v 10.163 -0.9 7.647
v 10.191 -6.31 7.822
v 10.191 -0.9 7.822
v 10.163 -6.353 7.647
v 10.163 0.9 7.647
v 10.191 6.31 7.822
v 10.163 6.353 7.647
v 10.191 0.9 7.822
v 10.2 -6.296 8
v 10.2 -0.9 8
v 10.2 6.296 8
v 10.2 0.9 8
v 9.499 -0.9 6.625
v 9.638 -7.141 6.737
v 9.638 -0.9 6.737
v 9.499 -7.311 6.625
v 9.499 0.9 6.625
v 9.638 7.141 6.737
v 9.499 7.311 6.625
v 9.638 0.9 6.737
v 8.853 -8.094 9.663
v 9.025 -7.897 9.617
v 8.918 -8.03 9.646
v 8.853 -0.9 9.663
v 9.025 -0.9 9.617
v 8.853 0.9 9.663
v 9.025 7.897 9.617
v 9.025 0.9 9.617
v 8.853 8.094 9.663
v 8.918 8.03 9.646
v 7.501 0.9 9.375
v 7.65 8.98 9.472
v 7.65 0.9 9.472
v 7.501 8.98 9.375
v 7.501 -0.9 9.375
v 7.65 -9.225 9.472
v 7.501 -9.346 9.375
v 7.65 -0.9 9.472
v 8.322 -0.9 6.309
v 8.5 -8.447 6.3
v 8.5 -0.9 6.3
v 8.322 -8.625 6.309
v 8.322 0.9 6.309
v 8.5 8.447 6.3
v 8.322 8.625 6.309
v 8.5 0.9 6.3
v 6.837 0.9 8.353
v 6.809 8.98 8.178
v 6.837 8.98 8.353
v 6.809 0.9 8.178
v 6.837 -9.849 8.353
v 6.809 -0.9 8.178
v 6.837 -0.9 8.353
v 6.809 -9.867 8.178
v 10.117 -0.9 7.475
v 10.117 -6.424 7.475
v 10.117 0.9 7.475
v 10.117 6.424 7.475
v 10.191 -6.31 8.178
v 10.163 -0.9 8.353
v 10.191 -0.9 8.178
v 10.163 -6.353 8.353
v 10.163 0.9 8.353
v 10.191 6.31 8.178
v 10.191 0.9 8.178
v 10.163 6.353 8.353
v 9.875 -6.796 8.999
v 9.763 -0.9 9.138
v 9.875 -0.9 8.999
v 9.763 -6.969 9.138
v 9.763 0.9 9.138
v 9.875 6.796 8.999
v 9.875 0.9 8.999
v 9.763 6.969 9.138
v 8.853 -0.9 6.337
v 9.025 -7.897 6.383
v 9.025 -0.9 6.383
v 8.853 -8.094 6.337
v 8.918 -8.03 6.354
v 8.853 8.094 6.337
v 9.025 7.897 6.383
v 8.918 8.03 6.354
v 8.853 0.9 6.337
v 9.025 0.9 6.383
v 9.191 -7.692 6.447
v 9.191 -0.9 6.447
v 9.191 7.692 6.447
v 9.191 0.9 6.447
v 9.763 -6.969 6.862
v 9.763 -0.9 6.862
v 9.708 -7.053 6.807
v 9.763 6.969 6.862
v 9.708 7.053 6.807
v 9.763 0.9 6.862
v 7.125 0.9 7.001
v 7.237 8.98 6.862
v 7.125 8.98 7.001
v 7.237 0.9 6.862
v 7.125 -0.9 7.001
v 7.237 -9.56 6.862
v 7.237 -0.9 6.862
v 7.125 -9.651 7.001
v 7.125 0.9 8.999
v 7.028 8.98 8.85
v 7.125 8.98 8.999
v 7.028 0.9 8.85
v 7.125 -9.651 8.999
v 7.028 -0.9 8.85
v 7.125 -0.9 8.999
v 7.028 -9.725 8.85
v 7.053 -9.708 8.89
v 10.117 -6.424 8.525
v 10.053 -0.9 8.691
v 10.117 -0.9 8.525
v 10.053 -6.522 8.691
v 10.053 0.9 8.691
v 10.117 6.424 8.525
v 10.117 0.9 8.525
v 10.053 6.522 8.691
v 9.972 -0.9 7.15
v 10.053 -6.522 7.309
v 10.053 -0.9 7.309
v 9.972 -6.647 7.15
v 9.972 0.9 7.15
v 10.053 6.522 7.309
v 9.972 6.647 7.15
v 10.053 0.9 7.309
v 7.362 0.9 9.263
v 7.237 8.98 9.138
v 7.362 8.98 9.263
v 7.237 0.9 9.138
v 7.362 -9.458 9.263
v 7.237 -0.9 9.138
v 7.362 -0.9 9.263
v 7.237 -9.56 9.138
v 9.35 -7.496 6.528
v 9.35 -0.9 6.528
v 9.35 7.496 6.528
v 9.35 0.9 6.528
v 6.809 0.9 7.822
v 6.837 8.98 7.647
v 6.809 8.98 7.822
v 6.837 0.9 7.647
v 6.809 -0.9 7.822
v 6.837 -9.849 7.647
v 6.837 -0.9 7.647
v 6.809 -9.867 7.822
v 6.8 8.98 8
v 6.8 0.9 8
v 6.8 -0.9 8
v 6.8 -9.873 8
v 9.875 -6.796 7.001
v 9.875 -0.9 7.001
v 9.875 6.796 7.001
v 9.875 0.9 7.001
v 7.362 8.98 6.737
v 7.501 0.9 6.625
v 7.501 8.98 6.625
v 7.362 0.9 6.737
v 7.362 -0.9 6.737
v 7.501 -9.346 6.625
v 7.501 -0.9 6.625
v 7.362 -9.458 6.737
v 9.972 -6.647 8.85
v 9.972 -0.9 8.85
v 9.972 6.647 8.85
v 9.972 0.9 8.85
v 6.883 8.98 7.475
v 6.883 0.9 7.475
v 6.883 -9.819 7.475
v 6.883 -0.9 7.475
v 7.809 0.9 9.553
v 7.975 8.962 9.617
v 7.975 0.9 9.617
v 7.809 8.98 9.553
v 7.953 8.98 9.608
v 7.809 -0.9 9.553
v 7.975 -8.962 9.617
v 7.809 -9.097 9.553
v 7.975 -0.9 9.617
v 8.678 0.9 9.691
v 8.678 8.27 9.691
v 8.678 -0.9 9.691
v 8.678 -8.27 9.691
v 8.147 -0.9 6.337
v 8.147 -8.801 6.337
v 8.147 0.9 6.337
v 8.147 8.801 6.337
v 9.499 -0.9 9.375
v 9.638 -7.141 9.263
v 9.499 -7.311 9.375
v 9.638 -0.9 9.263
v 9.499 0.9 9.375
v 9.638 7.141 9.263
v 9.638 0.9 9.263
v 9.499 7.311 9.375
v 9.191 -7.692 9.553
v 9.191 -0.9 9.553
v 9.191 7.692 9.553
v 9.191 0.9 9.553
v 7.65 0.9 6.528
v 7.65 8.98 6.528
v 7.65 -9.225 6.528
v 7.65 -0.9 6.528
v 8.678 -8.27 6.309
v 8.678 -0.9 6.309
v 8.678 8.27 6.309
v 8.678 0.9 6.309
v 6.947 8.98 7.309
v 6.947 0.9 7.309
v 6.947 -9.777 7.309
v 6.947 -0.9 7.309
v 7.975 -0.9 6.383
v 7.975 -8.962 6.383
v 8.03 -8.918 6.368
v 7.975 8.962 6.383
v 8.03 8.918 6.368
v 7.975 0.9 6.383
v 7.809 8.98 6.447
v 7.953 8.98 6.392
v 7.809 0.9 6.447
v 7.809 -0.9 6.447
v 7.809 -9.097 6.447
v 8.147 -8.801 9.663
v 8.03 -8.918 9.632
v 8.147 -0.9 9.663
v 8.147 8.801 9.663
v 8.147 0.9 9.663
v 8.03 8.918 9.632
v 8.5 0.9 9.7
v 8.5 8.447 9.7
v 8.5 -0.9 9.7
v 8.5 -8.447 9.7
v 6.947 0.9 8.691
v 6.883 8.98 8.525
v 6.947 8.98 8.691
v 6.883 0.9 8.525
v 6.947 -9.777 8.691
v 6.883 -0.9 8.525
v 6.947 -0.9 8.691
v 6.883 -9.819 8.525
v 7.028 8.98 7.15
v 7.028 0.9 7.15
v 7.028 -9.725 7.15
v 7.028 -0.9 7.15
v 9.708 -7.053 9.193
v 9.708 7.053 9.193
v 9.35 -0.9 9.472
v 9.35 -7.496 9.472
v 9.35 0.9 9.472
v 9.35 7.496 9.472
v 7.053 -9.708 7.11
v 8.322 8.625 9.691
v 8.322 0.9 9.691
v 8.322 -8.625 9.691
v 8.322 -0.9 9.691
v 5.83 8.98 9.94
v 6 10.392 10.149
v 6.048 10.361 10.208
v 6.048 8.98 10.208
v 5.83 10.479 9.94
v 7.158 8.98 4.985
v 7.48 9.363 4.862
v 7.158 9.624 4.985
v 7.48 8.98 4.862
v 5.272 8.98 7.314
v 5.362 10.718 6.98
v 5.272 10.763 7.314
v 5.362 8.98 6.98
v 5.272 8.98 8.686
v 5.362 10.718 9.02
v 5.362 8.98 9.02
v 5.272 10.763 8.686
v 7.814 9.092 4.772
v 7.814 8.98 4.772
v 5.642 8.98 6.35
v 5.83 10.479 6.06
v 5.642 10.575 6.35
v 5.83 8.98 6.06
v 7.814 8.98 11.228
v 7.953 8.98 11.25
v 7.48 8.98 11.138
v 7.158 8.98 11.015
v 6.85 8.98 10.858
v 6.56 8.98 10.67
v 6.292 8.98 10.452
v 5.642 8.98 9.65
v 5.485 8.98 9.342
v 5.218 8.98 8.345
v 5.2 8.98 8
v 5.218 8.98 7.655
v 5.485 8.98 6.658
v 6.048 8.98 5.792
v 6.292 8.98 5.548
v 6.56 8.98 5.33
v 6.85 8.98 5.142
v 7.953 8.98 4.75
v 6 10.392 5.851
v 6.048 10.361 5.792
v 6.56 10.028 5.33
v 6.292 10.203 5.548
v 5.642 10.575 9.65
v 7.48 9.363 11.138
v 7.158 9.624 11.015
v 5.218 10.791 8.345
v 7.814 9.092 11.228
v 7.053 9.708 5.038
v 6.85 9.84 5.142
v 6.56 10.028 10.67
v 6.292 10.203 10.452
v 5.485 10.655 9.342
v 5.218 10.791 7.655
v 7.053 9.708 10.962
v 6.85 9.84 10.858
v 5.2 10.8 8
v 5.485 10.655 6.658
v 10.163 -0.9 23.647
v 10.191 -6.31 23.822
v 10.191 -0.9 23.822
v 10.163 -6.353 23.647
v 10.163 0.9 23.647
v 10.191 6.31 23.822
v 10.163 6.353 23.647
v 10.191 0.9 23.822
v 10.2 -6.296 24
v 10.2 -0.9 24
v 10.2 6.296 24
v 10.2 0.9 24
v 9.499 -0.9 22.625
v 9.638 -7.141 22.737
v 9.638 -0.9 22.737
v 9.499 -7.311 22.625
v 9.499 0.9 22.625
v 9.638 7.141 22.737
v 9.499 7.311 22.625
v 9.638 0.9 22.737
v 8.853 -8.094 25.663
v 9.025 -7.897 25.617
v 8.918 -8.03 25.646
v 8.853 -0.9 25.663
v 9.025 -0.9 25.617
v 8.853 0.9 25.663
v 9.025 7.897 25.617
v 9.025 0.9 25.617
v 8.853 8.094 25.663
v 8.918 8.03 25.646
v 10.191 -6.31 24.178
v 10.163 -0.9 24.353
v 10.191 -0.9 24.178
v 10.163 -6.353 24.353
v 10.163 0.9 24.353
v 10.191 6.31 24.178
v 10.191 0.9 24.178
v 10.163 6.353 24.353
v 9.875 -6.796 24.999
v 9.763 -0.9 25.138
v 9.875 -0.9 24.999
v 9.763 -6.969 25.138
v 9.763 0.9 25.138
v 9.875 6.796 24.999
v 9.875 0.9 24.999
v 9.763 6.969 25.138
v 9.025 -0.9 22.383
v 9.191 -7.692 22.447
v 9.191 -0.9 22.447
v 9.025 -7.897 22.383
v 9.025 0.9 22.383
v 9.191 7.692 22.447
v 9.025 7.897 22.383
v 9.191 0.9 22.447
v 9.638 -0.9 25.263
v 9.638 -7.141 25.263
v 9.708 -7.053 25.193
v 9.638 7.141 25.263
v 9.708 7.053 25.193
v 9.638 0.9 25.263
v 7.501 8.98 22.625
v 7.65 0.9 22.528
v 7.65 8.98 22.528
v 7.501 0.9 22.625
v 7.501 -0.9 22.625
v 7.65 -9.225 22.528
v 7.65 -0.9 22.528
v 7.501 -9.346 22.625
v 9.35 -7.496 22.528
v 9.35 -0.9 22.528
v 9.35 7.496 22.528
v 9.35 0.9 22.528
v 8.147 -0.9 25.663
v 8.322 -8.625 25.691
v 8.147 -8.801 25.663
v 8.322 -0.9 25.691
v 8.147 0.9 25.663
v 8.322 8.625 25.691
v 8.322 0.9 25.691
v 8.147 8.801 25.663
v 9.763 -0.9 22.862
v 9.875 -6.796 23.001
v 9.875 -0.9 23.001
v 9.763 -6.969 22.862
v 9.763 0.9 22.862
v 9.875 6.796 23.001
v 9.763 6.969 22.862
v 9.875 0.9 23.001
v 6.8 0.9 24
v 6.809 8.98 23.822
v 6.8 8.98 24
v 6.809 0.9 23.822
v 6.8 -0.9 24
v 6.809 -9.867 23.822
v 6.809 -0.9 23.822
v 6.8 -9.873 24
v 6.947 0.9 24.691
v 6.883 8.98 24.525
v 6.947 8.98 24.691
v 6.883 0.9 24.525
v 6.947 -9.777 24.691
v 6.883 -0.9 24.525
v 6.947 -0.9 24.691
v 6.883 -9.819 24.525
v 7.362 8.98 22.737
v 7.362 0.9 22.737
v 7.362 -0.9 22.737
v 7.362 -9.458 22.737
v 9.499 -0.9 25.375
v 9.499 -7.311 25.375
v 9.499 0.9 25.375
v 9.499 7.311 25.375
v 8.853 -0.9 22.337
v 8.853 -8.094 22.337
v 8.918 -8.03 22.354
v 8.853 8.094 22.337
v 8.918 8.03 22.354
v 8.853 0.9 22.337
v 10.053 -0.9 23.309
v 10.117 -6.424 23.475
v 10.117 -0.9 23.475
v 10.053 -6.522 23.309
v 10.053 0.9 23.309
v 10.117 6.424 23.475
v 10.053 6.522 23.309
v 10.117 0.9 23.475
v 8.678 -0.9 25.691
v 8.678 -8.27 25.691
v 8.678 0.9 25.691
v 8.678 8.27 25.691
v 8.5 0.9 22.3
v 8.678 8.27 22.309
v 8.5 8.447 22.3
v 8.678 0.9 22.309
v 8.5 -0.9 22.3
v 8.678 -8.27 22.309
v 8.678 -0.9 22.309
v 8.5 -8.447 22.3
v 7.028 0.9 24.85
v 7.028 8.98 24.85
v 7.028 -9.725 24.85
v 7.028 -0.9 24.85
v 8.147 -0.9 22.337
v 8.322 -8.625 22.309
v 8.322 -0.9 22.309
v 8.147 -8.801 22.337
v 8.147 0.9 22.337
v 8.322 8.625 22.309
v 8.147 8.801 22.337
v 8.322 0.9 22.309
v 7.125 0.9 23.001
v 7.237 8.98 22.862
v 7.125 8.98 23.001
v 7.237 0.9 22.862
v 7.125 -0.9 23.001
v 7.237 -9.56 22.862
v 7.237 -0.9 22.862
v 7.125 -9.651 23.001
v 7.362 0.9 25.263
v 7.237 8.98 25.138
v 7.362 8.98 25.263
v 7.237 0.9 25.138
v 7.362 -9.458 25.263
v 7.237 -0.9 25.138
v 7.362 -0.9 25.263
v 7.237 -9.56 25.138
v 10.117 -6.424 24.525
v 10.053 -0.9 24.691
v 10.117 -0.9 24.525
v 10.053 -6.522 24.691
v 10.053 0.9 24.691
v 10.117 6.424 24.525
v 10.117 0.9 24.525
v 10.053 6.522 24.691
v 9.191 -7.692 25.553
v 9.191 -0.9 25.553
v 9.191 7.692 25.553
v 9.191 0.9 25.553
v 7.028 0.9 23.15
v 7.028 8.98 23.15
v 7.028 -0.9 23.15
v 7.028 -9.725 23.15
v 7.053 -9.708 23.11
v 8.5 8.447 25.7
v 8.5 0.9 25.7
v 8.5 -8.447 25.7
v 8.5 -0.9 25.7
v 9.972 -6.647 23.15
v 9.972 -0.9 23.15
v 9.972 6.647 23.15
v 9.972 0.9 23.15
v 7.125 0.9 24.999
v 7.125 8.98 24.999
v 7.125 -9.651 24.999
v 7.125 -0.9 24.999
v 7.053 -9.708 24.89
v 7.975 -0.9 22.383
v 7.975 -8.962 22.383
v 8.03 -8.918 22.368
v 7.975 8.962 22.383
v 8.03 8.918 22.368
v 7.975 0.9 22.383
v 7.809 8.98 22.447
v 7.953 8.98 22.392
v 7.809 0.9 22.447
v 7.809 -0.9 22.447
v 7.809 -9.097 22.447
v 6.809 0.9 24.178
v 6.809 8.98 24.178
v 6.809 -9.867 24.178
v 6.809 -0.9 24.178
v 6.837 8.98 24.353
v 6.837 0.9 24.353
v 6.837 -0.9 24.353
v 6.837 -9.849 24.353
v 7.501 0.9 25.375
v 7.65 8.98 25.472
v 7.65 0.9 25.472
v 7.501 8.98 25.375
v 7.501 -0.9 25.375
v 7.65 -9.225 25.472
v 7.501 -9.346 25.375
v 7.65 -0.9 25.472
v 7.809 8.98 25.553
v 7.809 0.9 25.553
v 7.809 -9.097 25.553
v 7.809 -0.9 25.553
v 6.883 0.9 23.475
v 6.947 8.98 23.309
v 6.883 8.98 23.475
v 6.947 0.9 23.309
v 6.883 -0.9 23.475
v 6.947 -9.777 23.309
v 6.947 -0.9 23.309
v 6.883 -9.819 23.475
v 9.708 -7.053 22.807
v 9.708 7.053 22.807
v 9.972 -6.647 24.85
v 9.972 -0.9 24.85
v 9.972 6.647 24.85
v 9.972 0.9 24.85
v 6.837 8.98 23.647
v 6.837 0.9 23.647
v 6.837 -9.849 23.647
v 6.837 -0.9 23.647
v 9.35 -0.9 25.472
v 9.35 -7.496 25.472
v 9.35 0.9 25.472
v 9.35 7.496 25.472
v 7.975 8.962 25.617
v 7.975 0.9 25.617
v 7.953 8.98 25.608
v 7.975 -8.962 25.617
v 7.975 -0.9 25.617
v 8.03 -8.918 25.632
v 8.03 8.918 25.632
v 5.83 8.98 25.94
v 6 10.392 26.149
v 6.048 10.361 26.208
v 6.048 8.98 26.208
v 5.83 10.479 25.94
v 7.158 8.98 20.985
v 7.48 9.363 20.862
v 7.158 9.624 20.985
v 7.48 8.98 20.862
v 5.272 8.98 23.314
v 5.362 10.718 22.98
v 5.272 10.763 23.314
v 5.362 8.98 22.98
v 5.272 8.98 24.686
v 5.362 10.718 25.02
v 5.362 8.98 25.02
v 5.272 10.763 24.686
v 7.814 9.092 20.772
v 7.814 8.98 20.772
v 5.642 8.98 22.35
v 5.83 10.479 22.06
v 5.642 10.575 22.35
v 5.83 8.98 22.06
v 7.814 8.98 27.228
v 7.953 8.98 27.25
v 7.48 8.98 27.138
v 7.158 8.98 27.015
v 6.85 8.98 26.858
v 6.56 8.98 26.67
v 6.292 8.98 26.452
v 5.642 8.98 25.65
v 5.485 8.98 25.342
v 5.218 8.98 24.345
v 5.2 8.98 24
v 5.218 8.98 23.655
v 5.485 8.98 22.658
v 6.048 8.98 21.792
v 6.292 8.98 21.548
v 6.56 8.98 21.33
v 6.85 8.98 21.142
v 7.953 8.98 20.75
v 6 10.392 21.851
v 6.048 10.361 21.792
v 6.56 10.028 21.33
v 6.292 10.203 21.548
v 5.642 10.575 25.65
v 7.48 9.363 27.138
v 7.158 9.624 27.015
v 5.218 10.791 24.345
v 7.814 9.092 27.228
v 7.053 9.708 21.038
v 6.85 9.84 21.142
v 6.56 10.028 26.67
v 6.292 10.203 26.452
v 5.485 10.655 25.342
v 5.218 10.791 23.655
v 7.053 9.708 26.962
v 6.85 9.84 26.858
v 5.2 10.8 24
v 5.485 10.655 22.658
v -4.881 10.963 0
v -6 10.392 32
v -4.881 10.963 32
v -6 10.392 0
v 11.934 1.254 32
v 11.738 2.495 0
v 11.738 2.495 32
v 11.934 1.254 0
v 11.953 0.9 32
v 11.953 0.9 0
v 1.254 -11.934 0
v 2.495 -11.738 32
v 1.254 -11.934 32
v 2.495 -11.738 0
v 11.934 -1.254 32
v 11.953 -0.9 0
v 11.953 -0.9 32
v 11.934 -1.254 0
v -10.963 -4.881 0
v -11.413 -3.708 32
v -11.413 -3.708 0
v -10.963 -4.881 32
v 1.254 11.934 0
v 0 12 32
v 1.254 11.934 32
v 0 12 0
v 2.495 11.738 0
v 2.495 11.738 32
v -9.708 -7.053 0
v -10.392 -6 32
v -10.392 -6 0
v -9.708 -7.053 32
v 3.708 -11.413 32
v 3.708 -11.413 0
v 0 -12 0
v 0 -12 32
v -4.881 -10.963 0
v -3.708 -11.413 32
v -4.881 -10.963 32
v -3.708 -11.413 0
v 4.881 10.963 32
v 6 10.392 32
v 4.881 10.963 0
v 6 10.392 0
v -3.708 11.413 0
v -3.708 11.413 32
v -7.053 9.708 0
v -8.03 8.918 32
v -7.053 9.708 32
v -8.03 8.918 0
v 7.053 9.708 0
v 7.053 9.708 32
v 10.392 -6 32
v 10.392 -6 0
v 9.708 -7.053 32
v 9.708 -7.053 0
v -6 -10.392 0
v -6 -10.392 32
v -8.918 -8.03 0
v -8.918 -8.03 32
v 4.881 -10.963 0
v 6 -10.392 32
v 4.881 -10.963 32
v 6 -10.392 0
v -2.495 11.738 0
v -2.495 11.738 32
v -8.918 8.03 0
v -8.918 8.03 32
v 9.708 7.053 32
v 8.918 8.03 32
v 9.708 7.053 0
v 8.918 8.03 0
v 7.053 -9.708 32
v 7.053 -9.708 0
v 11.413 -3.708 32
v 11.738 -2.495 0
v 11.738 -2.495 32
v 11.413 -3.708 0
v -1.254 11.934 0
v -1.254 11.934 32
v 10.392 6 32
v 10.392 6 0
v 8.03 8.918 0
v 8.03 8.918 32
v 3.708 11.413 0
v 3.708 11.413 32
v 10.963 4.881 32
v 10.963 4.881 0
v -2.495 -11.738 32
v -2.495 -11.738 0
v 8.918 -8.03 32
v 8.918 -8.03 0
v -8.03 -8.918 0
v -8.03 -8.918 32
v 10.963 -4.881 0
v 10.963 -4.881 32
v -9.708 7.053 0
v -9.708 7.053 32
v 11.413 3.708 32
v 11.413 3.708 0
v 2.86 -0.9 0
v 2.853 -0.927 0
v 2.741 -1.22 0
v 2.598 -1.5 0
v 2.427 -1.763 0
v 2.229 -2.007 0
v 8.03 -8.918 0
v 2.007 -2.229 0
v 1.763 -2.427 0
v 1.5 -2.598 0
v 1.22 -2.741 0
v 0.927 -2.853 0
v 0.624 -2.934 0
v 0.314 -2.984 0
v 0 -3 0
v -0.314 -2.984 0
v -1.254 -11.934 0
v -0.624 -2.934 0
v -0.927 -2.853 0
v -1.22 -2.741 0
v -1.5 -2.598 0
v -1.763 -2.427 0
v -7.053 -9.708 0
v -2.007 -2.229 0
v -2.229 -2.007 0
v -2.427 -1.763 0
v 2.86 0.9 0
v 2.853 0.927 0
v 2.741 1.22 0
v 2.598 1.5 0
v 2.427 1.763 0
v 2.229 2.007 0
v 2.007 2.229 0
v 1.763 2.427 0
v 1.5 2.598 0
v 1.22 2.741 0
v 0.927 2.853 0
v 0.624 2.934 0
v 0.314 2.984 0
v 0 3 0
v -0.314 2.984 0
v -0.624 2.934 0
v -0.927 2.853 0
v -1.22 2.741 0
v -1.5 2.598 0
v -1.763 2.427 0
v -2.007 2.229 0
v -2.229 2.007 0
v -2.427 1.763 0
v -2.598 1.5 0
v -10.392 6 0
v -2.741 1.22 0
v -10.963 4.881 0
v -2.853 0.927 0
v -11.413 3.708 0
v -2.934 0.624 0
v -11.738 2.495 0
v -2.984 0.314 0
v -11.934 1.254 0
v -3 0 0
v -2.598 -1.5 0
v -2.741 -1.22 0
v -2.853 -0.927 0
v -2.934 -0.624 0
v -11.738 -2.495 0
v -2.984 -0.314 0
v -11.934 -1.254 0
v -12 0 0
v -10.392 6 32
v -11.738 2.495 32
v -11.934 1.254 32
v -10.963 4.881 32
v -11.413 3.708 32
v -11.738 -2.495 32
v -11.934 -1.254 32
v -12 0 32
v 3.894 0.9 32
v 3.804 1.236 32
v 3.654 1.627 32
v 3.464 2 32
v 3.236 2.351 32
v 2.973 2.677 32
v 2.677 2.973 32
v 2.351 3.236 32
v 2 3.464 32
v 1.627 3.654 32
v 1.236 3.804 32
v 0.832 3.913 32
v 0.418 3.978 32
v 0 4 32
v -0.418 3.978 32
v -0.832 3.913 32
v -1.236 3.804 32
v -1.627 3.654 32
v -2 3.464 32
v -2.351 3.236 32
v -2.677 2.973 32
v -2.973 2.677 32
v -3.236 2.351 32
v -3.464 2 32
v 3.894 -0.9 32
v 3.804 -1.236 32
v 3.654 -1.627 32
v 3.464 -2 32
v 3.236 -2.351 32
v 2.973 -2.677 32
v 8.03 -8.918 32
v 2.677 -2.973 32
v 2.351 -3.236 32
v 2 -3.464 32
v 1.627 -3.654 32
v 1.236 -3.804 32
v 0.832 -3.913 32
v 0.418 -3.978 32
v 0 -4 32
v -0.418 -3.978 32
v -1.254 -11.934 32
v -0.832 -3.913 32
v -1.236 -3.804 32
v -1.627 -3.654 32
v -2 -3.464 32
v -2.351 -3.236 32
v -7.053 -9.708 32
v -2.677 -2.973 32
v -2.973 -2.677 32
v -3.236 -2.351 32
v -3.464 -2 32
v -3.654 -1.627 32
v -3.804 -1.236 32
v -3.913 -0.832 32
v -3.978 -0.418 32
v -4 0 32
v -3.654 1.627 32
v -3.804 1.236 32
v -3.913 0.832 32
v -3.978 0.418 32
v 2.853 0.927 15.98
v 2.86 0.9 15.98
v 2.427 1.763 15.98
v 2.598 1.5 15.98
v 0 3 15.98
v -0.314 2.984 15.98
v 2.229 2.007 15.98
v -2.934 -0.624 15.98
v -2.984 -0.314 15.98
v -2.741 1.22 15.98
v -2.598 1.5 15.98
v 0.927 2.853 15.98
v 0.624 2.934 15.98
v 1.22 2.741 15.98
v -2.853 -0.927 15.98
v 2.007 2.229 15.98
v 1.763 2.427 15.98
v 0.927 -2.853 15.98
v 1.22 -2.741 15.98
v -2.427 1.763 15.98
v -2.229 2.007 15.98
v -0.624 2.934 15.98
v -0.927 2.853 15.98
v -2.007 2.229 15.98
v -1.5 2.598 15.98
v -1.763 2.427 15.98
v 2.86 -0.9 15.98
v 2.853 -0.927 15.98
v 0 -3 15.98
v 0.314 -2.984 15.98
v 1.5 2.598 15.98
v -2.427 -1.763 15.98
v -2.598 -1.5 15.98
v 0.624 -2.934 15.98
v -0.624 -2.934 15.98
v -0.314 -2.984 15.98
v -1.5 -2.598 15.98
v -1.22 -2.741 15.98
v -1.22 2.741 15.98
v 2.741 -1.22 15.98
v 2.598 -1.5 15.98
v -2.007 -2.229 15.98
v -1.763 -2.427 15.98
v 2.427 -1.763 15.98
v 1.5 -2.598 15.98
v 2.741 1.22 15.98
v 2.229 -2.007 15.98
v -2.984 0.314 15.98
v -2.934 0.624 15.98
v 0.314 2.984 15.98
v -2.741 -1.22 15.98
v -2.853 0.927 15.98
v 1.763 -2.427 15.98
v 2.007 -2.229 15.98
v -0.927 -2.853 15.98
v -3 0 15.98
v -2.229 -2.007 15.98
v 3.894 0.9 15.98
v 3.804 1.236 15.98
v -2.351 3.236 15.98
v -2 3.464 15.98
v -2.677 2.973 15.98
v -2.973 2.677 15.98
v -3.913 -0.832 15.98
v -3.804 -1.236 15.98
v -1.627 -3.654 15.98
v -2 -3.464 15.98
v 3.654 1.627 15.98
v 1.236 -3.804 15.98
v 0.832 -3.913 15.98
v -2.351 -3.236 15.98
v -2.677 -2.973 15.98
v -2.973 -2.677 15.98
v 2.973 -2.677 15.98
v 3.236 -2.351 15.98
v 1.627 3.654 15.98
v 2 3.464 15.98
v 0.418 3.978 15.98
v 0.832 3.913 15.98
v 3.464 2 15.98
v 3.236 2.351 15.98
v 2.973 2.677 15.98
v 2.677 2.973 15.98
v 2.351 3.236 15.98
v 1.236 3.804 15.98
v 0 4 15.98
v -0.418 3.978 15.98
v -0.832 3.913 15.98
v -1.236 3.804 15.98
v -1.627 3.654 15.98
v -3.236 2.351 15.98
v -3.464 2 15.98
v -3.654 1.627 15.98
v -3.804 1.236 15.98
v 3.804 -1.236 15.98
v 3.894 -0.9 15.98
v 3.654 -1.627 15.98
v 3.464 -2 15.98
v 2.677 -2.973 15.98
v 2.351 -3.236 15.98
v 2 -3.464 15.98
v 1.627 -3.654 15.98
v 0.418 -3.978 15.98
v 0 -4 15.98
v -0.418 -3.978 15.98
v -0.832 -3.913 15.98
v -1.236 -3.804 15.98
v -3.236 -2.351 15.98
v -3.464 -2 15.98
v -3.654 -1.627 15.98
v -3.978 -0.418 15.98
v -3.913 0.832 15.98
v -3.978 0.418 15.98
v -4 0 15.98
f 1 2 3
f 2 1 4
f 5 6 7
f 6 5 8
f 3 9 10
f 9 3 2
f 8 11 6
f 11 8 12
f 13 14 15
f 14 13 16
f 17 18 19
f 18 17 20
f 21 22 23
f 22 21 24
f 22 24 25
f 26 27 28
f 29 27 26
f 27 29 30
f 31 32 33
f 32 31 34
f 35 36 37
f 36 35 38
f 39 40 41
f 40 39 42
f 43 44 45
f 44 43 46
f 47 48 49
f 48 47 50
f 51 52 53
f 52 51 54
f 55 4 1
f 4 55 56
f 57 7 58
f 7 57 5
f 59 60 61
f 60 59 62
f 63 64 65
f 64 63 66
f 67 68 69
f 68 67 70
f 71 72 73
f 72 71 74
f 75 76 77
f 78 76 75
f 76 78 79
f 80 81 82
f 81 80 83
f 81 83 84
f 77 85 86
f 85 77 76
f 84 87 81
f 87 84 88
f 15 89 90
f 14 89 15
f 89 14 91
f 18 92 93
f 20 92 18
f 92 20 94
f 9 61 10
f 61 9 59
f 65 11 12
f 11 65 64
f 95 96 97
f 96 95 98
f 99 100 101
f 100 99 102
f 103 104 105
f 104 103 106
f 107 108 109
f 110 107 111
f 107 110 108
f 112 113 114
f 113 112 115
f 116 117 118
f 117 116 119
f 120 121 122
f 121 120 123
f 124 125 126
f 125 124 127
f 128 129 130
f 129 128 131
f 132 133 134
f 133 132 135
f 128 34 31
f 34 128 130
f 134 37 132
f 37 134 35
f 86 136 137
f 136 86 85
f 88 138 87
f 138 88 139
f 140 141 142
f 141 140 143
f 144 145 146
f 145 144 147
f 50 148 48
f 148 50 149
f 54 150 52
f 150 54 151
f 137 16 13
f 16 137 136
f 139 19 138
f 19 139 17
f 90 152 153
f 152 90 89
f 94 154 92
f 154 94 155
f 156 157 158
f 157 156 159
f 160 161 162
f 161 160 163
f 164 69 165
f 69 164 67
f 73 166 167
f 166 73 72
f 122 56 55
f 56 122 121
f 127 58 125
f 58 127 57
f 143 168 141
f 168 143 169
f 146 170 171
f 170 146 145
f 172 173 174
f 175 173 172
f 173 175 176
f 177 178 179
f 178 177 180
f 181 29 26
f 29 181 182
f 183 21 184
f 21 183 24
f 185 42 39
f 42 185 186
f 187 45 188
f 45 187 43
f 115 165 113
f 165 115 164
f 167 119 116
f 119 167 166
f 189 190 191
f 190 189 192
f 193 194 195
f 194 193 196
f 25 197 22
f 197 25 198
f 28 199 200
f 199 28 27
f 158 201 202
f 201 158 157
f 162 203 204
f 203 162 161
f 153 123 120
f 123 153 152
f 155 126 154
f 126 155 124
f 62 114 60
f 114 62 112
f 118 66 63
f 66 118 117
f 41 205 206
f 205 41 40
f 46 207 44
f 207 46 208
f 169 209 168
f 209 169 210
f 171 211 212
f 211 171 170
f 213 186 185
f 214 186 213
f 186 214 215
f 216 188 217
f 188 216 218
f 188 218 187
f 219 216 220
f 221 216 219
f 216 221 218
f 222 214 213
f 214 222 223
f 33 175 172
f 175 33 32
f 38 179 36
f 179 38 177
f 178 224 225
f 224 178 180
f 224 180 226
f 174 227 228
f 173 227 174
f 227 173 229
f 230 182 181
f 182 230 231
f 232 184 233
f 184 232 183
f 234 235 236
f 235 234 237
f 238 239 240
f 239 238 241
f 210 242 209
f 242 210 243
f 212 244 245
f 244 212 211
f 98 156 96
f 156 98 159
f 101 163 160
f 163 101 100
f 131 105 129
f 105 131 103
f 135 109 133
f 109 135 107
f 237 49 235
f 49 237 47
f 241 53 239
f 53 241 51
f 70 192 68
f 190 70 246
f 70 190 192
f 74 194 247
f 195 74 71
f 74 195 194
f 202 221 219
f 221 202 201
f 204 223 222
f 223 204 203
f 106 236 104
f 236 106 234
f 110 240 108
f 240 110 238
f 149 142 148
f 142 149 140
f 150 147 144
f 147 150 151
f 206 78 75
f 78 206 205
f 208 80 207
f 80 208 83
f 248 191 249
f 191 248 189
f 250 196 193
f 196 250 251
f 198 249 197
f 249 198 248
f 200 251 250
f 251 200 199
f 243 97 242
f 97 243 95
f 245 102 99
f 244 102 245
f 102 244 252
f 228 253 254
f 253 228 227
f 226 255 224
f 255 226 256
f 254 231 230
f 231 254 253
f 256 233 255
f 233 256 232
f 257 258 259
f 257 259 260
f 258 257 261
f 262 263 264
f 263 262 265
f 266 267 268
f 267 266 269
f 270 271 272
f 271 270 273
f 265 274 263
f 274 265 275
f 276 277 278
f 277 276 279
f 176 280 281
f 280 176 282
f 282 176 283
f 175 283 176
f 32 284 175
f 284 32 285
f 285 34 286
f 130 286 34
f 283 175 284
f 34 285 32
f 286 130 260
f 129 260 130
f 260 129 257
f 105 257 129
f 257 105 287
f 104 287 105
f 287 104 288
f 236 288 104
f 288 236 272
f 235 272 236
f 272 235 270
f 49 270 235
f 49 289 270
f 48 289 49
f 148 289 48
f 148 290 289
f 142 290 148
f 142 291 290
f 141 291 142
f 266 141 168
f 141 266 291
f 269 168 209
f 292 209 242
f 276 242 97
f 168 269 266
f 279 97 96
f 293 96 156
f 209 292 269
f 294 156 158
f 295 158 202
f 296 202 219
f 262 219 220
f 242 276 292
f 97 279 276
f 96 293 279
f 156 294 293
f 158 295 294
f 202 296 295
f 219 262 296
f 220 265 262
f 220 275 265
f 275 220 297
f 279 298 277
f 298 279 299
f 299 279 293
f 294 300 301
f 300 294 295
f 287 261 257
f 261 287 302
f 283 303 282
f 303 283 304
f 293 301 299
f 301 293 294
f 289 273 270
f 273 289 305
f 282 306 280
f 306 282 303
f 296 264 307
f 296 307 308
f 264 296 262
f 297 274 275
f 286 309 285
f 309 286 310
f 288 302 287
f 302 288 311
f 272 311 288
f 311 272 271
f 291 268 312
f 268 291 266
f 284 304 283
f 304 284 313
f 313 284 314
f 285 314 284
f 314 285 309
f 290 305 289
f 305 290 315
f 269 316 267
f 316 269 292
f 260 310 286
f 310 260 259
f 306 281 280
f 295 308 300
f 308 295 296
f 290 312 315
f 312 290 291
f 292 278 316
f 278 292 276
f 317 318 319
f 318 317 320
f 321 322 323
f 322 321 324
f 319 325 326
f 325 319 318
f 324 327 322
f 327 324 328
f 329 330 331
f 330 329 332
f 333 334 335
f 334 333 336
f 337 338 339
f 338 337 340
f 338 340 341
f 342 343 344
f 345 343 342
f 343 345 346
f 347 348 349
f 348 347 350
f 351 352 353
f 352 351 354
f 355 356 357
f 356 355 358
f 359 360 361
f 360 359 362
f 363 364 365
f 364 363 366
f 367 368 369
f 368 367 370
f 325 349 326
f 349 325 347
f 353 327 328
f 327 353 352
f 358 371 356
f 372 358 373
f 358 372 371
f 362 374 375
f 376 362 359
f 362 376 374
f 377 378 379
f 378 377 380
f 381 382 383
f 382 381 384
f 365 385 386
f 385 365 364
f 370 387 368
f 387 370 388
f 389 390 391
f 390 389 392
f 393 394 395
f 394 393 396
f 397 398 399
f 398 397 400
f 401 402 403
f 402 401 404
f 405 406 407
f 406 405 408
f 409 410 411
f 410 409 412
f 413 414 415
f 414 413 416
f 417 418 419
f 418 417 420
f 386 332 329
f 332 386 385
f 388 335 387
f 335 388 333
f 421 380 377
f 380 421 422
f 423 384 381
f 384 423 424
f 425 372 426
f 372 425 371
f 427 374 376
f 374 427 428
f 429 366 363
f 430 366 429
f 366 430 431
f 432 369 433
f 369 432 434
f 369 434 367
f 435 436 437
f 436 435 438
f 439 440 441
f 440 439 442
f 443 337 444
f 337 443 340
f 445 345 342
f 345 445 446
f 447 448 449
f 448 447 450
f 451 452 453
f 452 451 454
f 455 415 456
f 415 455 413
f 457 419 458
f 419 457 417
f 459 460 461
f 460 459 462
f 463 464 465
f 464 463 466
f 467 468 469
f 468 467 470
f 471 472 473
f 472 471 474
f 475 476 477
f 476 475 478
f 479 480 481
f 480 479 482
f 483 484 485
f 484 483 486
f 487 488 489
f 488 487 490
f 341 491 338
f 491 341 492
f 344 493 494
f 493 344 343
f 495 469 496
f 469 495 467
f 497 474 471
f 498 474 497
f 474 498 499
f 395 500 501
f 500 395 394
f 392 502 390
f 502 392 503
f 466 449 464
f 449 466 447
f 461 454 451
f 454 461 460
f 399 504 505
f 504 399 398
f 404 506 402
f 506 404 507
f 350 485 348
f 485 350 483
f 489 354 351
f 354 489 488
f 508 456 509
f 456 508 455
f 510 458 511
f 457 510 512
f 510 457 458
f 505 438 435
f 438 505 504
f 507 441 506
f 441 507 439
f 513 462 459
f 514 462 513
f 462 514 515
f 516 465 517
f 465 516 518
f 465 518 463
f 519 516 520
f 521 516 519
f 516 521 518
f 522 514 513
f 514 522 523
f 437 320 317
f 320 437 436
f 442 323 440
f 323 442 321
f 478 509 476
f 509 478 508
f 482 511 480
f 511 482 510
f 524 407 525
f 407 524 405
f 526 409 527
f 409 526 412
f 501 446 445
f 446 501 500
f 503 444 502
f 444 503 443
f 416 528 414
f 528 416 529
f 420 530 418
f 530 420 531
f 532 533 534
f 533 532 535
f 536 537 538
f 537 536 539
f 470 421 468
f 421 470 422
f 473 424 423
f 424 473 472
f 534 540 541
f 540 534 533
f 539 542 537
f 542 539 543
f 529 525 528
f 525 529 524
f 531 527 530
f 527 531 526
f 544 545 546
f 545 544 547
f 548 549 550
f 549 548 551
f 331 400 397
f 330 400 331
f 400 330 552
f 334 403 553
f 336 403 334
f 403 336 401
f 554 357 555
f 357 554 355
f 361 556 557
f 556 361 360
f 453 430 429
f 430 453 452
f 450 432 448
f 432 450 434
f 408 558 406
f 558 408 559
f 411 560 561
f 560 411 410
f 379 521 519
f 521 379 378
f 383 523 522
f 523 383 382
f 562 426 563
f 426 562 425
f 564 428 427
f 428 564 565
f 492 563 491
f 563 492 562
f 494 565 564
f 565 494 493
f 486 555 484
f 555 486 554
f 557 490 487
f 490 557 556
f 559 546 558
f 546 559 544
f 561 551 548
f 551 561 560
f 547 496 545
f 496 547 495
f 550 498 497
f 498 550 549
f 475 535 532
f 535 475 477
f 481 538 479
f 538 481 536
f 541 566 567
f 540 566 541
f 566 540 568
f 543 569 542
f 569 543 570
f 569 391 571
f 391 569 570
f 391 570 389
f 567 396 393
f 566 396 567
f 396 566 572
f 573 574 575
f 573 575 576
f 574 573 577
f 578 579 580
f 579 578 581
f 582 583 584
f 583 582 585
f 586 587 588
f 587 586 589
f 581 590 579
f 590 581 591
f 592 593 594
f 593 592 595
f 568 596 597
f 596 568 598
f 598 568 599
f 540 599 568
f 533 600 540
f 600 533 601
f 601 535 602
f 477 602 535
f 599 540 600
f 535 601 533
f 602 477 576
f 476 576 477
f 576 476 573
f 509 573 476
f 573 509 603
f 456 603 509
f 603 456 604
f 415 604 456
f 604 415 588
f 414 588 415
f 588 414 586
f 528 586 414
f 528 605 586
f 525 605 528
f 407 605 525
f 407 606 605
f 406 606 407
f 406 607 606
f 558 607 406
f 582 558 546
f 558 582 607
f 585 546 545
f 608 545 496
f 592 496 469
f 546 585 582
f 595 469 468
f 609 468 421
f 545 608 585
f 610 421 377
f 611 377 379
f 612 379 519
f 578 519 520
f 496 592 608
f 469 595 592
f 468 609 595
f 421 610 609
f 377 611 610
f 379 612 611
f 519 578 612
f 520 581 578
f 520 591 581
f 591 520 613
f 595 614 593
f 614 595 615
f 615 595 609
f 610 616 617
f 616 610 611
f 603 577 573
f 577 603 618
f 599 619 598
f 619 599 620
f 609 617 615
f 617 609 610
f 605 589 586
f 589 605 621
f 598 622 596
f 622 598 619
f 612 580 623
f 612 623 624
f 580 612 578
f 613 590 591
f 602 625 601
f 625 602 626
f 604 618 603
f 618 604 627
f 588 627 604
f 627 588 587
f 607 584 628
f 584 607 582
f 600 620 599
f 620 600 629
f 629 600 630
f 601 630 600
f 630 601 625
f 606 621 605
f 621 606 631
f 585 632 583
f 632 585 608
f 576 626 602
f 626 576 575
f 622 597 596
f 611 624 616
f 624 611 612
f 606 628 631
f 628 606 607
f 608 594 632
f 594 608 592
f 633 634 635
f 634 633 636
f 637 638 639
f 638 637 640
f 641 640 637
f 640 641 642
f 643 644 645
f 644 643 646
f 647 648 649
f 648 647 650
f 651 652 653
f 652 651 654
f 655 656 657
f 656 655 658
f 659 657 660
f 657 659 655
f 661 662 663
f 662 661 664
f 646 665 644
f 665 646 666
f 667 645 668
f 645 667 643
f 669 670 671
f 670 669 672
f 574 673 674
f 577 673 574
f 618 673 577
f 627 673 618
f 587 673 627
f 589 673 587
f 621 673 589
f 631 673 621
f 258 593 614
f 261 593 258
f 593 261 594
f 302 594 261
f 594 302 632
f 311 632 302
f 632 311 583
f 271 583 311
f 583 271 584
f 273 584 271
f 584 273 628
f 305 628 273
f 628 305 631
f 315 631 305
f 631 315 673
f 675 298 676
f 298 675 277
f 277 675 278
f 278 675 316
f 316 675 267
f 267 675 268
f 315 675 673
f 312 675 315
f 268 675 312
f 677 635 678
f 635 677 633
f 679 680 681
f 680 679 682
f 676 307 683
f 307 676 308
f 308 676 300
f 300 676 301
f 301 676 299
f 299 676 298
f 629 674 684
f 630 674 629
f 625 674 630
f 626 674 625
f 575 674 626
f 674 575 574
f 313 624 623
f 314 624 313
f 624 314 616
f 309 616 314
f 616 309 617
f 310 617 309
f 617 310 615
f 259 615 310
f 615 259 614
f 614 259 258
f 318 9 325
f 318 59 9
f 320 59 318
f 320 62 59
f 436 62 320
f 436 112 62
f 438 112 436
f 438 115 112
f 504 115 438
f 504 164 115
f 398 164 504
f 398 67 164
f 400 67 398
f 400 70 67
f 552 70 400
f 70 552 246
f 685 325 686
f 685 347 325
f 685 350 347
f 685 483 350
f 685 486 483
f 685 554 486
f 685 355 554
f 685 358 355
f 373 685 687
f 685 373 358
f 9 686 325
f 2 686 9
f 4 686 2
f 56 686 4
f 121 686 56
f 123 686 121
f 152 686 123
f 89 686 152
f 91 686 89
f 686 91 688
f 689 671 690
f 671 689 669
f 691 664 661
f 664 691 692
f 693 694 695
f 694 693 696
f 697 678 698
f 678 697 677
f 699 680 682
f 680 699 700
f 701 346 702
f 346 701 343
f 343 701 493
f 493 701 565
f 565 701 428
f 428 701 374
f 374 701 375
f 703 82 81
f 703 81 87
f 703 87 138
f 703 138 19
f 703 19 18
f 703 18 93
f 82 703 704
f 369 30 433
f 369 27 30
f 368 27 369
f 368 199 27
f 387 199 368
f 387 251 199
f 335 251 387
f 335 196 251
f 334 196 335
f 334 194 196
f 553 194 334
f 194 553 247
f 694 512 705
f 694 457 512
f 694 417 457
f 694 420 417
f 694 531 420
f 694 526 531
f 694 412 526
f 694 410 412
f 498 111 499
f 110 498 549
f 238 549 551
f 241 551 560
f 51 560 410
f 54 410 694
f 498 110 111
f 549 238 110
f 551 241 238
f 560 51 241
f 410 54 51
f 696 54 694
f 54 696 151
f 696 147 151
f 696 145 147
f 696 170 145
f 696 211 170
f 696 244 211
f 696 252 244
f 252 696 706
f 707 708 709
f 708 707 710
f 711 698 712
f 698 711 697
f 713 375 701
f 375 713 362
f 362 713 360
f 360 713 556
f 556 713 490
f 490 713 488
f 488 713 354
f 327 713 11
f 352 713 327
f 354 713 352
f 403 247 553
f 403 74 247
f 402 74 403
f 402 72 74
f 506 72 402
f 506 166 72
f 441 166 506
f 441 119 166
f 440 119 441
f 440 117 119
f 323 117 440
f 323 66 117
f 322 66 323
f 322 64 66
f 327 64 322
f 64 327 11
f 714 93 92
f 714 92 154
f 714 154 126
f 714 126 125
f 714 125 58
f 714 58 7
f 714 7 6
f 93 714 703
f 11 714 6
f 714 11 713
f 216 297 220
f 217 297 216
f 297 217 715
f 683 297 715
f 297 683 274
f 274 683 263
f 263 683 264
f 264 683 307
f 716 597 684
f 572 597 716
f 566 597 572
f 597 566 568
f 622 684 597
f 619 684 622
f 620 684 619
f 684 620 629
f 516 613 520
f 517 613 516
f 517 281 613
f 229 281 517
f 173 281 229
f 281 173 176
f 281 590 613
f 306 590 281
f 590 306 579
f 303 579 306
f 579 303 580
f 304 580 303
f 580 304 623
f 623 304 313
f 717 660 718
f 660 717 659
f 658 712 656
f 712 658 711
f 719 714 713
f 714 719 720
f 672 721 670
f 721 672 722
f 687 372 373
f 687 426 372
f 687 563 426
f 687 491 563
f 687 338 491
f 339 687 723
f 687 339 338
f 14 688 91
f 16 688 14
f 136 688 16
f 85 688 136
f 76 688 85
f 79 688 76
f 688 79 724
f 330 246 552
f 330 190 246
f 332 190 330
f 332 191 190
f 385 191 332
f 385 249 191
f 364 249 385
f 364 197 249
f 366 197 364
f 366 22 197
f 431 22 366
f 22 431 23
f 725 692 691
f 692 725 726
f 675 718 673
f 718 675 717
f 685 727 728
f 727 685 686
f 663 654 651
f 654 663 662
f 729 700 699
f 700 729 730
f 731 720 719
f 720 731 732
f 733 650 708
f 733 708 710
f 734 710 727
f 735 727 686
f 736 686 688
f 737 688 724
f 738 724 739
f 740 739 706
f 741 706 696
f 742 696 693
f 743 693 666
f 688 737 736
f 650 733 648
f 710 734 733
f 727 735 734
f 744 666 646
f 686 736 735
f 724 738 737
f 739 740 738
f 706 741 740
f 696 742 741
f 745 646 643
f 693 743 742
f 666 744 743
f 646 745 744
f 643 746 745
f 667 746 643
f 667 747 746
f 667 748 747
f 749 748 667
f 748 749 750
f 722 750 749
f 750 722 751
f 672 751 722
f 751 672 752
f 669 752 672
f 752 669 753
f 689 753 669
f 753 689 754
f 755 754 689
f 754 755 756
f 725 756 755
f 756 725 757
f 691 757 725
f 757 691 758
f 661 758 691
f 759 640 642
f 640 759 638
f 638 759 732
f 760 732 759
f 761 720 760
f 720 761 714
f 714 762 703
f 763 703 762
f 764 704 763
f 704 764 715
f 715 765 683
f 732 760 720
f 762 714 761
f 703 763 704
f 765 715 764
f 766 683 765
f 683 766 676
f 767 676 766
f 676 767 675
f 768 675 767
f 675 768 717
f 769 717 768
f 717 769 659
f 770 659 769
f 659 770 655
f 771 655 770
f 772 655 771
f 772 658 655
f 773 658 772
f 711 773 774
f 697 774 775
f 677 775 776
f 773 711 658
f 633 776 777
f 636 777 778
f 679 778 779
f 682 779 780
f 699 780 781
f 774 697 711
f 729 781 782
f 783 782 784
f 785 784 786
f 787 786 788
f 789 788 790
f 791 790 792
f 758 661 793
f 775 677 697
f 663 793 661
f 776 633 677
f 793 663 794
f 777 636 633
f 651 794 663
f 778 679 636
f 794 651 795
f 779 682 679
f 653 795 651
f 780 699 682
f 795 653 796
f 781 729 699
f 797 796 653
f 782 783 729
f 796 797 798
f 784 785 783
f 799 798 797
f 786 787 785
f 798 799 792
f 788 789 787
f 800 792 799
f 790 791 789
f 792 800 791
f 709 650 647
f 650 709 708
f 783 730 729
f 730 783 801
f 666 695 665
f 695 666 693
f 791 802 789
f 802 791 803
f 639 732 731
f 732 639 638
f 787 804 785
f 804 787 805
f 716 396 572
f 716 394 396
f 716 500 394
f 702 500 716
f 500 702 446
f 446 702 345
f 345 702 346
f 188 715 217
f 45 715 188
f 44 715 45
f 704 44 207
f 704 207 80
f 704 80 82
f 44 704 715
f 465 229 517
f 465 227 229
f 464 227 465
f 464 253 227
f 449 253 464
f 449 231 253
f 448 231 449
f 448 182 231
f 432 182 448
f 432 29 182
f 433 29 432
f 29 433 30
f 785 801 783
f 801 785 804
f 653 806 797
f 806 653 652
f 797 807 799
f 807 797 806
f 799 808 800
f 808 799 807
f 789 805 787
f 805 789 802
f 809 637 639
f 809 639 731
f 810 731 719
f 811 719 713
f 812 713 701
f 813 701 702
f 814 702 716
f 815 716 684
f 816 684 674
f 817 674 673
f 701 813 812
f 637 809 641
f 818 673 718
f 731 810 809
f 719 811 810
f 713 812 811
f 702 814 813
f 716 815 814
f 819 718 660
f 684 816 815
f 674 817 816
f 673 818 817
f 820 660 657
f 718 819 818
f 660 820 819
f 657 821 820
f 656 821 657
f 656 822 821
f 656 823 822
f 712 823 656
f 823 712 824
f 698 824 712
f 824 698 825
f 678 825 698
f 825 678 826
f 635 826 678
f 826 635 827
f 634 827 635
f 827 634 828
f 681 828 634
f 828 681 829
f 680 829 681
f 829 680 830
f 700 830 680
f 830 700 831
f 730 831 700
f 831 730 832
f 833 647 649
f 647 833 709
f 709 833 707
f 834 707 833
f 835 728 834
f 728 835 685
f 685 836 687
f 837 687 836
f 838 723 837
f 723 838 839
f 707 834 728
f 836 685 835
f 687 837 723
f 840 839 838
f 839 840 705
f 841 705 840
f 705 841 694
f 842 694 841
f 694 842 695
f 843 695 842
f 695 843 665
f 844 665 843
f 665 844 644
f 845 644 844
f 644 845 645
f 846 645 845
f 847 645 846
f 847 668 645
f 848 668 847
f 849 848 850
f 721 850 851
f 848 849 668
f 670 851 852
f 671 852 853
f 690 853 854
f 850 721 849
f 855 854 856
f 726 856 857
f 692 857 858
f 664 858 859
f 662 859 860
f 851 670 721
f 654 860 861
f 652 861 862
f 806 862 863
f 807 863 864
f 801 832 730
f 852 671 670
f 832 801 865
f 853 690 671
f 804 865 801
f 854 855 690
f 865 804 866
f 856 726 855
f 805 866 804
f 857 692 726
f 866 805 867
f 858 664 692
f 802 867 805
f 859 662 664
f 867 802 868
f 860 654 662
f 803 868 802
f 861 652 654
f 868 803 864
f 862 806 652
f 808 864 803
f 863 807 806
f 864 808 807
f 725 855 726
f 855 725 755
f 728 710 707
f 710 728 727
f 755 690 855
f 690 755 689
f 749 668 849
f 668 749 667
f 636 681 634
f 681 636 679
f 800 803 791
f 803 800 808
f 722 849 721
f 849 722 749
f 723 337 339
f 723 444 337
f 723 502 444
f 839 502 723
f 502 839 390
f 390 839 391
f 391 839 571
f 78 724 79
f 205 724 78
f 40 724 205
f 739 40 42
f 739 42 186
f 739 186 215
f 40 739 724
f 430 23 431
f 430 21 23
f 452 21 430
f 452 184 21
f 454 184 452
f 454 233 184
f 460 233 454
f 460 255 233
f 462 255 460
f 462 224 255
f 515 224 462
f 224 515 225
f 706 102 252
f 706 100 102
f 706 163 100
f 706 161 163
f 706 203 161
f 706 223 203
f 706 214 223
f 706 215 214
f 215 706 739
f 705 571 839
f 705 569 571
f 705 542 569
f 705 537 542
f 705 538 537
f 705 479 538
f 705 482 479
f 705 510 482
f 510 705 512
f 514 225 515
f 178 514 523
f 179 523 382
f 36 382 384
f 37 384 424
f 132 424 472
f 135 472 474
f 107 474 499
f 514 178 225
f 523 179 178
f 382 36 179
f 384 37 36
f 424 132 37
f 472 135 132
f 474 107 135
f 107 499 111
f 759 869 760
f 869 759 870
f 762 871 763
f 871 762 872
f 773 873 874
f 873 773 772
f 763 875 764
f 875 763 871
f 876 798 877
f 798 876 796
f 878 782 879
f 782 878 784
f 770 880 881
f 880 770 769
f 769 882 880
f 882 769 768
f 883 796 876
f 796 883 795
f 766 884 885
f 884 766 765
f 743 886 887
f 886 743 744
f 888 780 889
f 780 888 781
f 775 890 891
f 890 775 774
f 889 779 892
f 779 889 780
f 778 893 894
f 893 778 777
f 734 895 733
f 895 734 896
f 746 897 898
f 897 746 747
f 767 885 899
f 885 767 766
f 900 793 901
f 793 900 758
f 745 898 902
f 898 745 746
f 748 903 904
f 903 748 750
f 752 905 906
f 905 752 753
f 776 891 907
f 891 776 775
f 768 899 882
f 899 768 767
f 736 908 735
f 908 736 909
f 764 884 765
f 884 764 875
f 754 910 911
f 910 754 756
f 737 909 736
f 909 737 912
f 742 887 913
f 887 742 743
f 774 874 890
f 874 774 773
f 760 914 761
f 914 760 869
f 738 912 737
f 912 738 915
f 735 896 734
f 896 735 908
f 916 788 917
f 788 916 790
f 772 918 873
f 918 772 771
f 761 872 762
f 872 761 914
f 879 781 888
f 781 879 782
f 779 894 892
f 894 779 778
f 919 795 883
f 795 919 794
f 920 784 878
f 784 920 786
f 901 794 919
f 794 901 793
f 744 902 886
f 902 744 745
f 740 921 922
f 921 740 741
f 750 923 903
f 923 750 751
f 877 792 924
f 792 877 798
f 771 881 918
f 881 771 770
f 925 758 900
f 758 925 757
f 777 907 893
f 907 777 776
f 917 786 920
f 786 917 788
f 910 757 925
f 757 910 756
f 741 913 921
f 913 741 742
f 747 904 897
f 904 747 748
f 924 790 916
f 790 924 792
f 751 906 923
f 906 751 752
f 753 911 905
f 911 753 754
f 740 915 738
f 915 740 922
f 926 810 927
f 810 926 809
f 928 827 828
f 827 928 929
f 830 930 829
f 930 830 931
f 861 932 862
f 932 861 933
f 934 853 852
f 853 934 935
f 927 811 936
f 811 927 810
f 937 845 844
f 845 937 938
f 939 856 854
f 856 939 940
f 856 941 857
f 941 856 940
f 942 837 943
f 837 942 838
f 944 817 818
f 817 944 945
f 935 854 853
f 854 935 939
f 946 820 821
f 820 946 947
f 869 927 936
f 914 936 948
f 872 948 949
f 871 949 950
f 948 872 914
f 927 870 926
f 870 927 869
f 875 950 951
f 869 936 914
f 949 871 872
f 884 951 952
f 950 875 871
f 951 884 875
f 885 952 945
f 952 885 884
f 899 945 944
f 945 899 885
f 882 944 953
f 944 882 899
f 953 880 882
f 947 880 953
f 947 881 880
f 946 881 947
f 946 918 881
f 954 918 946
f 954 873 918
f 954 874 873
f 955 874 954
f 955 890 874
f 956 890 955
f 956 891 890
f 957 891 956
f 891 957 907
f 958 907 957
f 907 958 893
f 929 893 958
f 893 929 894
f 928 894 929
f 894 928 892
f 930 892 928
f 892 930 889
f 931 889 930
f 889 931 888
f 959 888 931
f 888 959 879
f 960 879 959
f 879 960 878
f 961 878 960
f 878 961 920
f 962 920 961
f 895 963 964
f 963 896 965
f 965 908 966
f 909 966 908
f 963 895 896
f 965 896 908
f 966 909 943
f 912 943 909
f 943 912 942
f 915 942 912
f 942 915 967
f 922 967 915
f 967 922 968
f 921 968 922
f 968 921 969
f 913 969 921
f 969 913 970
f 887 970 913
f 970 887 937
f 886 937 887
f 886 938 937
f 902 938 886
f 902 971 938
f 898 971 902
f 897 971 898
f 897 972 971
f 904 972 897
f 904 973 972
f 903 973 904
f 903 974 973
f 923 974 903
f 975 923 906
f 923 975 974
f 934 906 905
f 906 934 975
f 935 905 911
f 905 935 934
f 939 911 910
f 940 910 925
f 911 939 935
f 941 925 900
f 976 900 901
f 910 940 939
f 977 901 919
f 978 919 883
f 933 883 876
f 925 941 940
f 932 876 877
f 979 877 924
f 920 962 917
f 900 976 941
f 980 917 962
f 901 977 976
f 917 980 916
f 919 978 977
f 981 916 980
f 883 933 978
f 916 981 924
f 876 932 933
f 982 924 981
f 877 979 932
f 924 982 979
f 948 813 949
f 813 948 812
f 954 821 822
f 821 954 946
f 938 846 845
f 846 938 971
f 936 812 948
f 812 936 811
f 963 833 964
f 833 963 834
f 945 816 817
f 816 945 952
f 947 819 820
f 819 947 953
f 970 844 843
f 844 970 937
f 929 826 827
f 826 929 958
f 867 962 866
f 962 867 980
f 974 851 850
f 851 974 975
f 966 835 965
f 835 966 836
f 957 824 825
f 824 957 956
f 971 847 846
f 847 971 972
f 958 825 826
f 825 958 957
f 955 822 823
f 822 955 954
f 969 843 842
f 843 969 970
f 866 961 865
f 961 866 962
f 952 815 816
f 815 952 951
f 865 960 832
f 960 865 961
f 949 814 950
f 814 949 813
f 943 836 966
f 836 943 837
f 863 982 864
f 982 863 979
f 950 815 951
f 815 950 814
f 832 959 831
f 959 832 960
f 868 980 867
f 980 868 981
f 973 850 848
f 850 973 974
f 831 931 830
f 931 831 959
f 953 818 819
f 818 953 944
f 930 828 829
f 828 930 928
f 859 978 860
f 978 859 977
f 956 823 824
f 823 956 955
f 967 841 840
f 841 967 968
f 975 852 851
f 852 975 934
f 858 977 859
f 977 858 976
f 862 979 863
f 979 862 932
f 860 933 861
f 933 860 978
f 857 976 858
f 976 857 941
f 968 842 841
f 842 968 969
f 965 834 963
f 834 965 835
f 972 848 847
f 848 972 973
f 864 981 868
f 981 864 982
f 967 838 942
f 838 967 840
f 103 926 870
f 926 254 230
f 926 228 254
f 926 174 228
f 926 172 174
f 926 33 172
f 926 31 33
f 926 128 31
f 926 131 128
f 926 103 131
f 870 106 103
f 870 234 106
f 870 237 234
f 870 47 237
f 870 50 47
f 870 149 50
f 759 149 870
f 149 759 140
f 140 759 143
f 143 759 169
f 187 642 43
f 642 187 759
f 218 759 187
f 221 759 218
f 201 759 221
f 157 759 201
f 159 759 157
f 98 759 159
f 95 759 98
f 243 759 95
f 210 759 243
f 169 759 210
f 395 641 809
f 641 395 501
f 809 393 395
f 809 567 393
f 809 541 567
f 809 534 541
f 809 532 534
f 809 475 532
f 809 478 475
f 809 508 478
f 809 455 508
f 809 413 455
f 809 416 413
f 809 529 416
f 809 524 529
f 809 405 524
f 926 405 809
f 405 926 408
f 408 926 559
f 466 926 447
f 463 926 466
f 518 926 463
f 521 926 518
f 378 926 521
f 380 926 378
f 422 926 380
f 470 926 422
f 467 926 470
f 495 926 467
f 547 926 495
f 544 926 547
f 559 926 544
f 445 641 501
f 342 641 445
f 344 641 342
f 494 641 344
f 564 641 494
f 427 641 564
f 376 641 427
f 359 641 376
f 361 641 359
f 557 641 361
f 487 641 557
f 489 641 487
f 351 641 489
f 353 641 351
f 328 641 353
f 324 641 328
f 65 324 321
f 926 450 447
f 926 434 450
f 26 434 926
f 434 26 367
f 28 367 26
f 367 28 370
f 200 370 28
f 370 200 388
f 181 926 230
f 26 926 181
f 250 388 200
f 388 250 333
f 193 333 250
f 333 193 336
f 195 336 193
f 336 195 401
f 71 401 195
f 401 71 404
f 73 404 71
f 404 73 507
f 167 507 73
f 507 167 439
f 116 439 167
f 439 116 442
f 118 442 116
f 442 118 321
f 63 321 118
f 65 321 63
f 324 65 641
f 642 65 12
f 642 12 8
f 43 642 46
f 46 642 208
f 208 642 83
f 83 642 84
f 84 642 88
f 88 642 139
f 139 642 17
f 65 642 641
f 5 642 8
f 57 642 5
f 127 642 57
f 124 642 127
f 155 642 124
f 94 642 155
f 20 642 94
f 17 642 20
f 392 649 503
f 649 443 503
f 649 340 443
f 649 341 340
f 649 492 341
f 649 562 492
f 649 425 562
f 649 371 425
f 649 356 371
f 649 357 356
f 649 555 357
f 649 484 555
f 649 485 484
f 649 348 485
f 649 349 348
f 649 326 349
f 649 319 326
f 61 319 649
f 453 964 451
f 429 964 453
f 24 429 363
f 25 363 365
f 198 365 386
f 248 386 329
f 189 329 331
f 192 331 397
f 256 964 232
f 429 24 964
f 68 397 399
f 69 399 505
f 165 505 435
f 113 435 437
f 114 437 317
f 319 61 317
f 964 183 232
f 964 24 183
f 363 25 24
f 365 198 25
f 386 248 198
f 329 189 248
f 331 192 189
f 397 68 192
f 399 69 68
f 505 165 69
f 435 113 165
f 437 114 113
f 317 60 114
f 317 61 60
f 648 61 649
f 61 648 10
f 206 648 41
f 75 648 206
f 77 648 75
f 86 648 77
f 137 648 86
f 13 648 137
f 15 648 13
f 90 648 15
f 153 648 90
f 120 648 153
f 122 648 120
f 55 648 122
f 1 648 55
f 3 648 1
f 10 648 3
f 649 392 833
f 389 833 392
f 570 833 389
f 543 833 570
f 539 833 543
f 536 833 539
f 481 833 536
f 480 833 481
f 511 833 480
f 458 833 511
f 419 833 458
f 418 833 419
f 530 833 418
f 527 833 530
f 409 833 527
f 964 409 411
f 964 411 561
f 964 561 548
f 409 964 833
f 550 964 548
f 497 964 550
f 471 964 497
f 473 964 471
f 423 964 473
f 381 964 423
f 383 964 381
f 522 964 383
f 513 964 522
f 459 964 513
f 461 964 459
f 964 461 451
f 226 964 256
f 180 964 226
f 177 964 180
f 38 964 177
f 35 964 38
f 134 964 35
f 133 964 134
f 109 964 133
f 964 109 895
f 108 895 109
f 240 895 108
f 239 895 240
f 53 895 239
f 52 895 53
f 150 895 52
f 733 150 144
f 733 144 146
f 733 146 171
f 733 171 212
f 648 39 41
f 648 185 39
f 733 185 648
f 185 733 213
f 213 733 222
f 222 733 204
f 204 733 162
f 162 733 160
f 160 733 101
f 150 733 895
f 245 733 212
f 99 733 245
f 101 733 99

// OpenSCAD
// Split shaft coupling 6 mm to 8 mm.
$fn = 60;
eps = 0.02;
shaft_a = 6;
shaft_b = 8;
outer_d = 24;
length = 32;
slit_w = 1.8;
screw_d = 3.4;
module clamp_hole(z) {
    translate([outer_d / 2 - 3.5, -outer_d / 2 - eps, z]) rotate([-90, 0, 0]) cylinder(d = screw_d, h = outer_d + 2 * eps);
    translate([outer_d / 2 - 3.5, outer_d / 2 - 3 - eps, z]) rotate([-90, 0, 0]) cylinder(d = 6.6, h = 3 + 2 * eps);
}
difference() {
    cylinder(d = outer_d, h = length);
    translate([0, 0, -eps]) cylinder(d = shaft_a, h = length / 2 + eps);
    translate([0, 0, length / 2 - eps]) cylinder(d = shaft_b, h = length / 2 + eps);
    translate([0, -slit_w / 2, -eps]) cube([outer_d / 2 + eps, slit_w, length + 2 * eps]);
    clamp_hole(length / 4);
    clamp_hole(3 * length / 4);
}
